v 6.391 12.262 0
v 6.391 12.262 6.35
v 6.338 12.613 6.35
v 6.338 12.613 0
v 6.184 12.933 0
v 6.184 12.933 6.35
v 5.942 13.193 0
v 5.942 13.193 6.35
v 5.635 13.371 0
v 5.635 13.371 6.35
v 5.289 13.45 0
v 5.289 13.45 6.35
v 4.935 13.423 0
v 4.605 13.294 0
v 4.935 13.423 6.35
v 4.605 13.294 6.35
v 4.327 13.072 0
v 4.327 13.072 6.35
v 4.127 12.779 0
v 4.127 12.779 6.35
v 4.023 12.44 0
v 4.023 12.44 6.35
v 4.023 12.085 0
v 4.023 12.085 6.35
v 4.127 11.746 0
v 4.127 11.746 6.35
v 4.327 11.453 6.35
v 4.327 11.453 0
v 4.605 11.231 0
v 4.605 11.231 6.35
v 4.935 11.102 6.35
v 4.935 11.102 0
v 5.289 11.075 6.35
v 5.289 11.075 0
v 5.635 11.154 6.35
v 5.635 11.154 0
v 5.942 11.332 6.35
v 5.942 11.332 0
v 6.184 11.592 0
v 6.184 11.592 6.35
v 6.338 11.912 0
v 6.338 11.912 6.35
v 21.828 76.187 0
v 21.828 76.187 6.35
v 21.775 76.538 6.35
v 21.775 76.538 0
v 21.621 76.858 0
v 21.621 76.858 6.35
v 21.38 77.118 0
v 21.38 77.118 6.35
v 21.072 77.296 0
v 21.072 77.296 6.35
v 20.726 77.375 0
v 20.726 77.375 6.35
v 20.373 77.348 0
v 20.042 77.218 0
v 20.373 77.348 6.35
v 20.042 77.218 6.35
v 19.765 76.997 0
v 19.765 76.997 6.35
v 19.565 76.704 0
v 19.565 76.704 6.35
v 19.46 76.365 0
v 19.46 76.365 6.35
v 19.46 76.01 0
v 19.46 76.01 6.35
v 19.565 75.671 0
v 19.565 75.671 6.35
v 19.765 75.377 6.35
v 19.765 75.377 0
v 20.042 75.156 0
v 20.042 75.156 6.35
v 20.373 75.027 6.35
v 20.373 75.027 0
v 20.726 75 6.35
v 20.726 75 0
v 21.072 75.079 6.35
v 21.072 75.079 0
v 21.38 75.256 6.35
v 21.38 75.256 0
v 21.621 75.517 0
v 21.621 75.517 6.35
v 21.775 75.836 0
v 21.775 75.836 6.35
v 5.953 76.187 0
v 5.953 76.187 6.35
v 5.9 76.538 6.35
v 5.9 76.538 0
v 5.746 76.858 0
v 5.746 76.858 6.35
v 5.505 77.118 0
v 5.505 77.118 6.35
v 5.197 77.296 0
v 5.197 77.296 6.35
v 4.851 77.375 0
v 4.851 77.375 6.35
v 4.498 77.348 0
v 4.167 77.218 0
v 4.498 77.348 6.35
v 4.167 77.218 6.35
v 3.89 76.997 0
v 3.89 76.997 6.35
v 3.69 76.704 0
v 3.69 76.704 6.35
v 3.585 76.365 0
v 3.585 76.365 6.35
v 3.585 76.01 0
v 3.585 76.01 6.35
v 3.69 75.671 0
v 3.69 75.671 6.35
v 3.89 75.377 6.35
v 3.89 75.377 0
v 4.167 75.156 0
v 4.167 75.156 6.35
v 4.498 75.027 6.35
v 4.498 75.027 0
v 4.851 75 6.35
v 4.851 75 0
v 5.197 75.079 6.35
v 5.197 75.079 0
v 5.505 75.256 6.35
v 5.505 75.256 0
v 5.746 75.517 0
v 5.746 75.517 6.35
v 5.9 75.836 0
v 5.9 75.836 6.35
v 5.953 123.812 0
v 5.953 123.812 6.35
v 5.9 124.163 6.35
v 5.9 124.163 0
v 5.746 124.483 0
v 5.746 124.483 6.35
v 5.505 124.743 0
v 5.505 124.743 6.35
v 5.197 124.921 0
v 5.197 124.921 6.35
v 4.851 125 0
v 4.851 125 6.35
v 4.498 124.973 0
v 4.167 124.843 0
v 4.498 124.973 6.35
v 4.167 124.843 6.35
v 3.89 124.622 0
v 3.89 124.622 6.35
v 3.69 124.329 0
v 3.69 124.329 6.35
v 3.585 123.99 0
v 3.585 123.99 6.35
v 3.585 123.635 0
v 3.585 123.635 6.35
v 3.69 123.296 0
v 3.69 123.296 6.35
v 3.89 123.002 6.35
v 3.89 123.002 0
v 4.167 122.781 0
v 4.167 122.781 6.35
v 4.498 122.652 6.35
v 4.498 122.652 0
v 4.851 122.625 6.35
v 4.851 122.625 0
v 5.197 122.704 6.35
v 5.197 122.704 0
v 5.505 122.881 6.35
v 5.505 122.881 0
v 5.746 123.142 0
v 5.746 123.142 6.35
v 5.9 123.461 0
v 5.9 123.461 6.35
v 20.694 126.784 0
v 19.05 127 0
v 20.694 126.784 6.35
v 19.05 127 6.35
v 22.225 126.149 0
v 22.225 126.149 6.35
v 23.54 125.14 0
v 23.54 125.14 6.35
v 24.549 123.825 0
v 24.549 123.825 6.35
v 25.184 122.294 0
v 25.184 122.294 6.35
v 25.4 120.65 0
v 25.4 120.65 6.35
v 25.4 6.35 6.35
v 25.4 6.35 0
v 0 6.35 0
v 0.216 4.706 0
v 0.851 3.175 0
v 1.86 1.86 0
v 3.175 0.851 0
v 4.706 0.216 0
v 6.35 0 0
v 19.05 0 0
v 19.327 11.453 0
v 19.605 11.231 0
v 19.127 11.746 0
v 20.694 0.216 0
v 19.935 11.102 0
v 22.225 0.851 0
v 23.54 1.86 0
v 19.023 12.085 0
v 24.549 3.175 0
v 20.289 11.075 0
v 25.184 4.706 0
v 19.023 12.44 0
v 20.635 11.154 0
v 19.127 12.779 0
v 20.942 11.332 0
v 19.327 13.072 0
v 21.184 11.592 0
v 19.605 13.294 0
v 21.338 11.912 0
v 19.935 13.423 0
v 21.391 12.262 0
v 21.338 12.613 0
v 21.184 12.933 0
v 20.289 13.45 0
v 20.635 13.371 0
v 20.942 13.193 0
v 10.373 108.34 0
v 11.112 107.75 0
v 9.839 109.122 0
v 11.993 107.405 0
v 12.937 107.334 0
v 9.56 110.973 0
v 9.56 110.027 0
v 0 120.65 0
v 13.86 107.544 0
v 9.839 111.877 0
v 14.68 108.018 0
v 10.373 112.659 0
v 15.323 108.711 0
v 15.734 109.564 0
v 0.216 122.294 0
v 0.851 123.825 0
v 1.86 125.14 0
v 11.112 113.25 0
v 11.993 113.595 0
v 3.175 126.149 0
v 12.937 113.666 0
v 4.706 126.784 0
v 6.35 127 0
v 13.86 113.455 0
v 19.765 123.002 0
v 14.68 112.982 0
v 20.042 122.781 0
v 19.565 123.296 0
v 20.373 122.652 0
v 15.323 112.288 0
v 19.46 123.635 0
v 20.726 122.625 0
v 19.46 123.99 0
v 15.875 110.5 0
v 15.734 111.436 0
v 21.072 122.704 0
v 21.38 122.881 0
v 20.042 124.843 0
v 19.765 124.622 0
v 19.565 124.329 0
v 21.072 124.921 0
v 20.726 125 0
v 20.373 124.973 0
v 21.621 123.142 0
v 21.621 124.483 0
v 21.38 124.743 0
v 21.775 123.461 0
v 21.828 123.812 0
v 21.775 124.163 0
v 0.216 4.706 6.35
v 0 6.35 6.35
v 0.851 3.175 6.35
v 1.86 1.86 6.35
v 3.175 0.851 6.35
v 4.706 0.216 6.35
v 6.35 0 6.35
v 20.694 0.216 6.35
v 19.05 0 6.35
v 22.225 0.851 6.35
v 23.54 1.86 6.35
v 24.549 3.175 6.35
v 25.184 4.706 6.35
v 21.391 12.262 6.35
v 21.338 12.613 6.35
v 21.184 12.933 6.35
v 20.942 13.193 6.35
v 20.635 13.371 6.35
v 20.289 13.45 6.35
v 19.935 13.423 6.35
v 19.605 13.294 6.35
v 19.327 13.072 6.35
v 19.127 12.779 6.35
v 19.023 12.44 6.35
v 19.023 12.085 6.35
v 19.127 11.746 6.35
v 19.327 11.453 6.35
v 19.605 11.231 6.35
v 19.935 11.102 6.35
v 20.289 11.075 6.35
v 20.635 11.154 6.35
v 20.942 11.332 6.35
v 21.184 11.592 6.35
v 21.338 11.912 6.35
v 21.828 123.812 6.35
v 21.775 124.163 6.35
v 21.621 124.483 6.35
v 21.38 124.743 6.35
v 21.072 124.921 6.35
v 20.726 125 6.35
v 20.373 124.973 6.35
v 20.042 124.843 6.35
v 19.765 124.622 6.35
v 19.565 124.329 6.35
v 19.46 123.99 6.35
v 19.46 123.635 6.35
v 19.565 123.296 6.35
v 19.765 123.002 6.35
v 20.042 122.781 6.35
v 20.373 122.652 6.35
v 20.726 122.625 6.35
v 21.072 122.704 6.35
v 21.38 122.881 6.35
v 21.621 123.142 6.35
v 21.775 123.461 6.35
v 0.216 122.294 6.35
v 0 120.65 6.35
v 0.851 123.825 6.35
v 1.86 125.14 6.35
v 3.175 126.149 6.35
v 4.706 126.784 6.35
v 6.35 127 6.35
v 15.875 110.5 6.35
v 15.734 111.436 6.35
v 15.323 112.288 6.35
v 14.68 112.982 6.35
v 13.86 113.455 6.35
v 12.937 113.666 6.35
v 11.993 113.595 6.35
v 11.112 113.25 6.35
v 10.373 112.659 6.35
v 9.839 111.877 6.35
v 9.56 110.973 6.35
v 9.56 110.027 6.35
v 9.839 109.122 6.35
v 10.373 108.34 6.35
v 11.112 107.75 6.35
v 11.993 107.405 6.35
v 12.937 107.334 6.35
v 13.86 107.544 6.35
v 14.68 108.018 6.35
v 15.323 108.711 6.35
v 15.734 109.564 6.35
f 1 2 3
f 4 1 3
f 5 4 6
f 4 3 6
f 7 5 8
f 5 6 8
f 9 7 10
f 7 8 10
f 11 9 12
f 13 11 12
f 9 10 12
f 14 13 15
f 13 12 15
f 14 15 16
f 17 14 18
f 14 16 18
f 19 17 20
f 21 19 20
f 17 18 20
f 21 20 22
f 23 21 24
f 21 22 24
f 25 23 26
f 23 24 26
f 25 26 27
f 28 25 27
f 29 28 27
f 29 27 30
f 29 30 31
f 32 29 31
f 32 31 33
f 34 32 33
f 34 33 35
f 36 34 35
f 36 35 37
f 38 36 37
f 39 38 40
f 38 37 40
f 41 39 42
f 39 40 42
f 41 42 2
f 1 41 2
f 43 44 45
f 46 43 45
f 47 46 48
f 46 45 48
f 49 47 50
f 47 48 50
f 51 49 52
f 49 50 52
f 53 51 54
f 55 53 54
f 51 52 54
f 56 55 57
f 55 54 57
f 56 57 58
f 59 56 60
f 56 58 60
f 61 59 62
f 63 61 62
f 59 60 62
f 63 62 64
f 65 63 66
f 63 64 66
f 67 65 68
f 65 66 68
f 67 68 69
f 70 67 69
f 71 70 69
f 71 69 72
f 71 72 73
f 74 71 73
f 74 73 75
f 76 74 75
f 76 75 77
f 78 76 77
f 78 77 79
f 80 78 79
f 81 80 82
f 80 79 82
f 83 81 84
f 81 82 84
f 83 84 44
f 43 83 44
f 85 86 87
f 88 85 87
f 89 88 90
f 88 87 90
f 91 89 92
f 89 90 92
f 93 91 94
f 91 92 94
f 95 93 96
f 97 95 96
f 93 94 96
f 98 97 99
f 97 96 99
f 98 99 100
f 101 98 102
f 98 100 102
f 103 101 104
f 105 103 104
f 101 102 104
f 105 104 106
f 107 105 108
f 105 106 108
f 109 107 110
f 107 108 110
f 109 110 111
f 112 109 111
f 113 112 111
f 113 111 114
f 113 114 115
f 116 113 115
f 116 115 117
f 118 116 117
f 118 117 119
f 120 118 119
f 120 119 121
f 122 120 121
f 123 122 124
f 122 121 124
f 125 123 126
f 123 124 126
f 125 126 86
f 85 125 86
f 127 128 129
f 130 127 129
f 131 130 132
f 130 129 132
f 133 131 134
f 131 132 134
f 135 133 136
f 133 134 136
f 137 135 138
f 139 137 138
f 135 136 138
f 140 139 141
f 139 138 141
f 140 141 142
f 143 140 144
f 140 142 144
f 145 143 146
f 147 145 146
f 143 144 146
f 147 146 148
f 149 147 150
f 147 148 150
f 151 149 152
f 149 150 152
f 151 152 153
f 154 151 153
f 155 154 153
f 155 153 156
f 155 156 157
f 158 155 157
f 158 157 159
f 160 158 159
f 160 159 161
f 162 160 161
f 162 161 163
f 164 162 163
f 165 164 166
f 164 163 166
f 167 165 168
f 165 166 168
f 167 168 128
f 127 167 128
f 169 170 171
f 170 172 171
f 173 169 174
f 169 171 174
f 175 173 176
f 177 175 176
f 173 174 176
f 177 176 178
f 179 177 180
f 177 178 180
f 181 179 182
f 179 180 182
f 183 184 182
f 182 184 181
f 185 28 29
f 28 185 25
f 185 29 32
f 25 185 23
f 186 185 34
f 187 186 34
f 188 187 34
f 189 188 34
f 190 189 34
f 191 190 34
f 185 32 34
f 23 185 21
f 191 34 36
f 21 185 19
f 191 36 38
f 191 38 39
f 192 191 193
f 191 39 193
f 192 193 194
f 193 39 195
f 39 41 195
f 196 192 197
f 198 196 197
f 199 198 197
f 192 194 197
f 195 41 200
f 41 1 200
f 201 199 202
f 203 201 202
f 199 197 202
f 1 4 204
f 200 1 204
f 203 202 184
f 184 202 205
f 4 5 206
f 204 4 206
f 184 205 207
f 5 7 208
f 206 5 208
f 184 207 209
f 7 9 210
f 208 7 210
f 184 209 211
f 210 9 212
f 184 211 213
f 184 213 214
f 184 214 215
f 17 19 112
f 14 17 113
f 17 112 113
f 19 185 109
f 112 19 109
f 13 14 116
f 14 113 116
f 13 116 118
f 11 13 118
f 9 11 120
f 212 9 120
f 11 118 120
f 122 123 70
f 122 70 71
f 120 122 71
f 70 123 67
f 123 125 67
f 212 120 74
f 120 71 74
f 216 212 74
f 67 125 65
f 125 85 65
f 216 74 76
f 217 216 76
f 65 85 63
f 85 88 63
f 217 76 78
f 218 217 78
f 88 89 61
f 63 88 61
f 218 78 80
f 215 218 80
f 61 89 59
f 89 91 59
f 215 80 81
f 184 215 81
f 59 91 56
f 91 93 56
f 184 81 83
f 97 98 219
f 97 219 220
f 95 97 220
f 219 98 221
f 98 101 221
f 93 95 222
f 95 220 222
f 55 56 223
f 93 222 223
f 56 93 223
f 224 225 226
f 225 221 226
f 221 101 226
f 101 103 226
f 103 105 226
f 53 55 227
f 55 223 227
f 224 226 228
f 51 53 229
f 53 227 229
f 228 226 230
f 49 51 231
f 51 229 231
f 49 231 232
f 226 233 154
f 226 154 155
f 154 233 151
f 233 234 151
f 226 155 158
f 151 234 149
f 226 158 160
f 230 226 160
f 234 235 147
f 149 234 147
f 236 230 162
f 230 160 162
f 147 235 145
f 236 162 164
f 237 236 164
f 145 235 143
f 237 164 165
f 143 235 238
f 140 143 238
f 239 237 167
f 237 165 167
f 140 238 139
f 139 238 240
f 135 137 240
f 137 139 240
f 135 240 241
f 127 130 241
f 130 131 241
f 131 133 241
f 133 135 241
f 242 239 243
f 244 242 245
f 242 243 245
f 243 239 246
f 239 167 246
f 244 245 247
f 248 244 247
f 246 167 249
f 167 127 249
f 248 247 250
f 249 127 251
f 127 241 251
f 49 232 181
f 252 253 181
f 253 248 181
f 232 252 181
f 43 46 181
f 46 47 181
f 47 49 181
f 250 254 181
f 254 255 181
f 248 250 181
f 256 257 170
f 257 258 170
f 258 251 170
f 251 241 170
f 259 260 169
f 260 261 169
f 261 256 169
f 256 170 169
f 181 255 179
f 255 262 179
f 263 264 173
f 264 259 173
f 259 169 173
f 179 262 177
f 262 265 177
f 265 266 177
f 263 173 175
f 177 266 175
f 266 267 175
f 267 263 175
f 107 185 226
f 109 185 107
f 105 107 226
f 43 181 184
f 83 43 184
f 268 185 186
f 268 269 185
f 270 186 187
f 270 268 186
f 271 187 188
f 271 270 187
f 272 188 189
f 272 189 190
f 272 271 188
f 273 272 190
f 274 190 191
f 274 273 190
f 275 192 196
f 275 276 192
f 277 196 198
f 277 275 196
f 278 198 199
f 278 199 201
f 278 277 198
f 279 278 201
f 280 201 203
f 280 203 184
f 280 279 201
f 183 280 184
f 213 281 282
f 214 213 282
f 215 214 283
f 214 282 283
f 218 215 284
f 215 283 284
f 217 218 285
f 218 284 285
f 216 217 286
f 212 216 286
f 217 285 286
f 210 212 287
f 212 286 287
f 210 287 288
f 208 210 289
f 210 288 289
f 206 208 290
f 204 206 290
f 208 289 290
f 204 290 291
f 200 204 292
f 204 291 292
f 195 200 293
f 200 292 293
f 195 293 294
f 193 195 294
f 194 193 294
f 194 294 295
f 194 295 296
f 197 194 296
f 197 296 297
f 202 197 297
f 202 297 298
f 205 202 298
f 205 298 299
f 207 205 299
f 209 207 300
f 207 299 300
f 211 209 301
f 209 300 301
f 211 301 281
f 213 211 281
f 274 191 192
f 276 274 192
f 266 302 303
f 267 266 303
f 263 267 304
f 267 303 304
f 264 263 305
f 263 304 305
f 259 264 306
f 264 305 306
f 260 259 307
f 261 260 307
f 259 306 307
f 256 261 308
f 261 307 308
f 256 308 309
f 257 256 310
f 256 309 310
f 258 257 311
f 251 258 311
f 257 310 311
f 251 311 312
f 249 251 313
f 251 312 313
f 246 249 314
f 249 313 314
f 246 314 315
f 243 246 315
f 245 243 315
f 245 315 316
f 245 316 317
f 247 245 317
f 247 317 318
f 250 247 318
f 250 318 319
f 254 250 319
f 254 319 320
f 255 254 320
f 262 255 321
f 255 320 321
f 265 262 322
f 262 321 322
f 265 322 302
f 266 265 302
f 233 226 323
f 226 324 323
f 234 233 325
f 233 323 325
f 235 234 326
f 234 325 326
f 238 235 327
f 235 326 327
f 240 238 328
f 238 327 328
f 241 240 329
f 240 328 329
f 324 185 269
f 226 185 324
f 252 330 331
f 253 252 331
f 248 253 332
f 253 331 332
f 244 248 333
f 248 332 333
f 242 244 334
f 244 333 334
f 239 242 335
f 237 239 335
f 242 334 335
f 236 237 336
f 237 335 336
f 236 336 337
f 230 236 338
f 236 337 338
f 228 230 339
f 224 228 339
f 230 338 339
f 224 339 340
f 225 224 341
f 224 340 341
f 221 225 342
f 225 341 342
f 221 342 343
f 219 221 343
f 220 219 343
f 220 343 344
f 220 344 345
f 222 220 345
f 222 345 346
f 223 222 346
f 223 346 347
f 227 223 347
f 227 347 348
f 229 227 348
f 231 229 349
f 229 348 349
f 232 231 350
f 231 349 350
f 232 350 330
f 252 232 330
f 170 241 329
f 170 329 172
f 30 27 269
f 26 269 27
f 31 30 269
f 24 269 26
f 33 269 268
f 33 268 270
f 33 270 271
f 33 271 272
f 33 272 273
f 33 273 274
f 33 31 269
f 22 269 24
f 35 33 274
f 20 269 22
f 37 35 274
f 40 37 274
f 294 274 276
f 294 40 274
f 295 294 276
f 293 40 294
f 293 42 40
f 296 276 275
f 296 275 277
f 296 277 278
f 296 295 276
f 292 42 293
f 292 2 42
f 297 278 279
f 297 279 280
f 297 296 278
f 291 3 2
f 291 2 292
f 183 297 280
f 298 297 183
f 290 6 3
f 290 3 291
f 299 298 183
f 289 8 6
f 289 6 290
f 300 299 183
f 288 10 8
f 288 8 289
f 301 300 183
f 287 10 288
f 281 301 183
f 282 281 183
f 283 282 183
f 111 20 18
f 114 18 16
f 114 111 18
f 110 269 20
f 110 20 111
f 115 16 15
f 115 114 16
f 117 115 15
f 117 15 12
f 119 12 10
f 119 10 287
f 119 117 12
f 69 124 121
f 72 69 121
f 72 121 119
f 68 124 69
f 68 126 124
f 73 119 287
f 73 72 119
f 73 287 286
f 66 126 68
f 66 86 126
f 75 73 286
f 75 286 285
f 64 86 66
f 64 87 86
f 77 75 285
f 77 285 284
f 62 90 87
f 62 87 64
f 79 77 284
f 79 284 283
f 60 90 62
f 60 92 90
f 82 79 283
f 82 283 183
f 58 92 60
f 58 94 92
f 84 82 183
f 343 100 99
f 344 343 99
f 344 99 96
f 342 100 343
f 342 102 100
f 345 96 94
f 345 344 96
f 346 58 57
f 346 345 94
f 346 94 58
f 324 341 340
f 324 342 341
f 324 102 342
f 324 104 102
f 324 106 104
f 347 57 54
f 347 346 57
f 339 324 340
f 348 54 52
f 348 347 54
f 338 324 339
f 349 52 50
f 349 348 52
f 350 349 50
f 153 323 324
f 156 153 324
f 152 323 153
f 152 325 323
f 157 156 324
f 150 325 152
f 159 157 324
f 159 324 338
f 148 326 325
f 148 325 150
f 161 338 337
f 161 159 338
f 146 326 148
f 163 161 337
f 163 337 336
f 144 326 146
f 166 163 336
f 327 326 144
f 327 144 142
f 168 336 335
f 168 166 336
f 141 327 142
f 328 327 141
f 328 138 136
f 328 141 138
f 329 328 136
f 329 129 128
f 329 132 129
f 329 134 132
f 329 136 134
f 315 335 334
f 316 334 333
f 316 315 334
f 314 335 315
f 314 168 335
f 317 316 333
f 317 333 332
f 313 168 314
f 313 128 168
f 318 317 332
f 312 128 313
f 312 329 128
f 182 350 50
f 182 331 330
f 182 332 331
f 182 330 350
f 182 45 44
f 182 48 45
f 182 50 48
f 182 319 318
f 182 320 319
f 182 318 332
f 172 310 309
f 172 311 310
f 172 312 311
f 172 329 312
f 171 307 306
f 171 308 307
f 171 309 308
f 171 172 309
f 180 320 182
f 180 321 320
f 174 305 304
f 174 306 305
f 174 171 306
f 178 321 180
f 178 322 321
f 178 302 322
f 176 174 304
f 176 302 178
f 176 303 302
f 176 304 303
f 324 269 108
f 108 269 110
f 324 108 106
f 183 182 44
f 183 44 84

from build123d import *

# Parameters (mm, degrees)
SKETCH1_W           = 25.4
SKETCH1_H           = 127
BOSS_EXTRUDE1_DEPTH = 6.35
SKETCH2_R           = 1.190625
CUT_EXTRUDE1_DEPTH  = 6.35
FILLET1_R           = 6.35
SKETCH3_R           = 3.175
CUT_EXTRUDE2_DEPTH  = 6.35
SKETCH4_R           = 1.190625
CUT_EXTRUDE3_DEPTH  = 6.35


with BuildPart() as part:
    # Sketch1 → Boss-Extrude1 (new body)
    with BuildSketch(Plane.XY):
        with Locations((12.7, 63.5)):
            Rectangle(SKETCH1_W, SKETCH1_H)
    extrude(amount=BOSS_EXTRUDE1_DEPTH)

    # Sketch2 → Cut-Extrude1 (cut)
    with BuildSketch(Plane.XY.offset(6.35)):
        with Locations((5.2, 12.2625)):
            Circle(SKETCH2_R)
        with Locations((20.2, 12.2625)):
            Circle(SKETCH2_R)
    extrude(amount=-CUT_EXTRUDE1_DEPTH, mode=Mode.SUBTRACT)

    # Fillet1
    fillet1_edges = [part.edges().sort_by_distance(p)[0] for p in [
        (0, 127, 3.175),
        (25.4, 127, 3.175),
        (25.4, 0, 3.175),
        (0, 0, 3.175),
    ]]
    fillet(fillet1_edges, radius=FILLET1_R)

    # Sketch3 → Cut-Extrude2 (cut)
    with BuildSketch(Plane.XY.offset(6.35)):
        with Locations((12.7, 110.49991)):
            Circle(SKETCH3_R)
    extrude(amount=-CUT_EXTRUDE2_DEPTH, mode=Mode.SUBTRACT)

    # Sketch4 → Cut-Extrude3 (cut)
    with BuildSketch(Plane.XY.offset(6.35)):
        with Locations((4.7625, 123.8123)):
            Circle(SKETCH4_R)
        with Locations((20.6375, 123.8123)):
            Circle(SKETCH4_R)
        with Locations((20.6375, 76.1873)):
            Circle(SKETCH4_R)
        with Locations((4.7625, 76.1873)):
            Circle(SKETCH4_R)
    extrude(amount=-CUT_EXTRUDE3_DEPTH, mode=Mode.SUBTRACT)


solid = part.part
